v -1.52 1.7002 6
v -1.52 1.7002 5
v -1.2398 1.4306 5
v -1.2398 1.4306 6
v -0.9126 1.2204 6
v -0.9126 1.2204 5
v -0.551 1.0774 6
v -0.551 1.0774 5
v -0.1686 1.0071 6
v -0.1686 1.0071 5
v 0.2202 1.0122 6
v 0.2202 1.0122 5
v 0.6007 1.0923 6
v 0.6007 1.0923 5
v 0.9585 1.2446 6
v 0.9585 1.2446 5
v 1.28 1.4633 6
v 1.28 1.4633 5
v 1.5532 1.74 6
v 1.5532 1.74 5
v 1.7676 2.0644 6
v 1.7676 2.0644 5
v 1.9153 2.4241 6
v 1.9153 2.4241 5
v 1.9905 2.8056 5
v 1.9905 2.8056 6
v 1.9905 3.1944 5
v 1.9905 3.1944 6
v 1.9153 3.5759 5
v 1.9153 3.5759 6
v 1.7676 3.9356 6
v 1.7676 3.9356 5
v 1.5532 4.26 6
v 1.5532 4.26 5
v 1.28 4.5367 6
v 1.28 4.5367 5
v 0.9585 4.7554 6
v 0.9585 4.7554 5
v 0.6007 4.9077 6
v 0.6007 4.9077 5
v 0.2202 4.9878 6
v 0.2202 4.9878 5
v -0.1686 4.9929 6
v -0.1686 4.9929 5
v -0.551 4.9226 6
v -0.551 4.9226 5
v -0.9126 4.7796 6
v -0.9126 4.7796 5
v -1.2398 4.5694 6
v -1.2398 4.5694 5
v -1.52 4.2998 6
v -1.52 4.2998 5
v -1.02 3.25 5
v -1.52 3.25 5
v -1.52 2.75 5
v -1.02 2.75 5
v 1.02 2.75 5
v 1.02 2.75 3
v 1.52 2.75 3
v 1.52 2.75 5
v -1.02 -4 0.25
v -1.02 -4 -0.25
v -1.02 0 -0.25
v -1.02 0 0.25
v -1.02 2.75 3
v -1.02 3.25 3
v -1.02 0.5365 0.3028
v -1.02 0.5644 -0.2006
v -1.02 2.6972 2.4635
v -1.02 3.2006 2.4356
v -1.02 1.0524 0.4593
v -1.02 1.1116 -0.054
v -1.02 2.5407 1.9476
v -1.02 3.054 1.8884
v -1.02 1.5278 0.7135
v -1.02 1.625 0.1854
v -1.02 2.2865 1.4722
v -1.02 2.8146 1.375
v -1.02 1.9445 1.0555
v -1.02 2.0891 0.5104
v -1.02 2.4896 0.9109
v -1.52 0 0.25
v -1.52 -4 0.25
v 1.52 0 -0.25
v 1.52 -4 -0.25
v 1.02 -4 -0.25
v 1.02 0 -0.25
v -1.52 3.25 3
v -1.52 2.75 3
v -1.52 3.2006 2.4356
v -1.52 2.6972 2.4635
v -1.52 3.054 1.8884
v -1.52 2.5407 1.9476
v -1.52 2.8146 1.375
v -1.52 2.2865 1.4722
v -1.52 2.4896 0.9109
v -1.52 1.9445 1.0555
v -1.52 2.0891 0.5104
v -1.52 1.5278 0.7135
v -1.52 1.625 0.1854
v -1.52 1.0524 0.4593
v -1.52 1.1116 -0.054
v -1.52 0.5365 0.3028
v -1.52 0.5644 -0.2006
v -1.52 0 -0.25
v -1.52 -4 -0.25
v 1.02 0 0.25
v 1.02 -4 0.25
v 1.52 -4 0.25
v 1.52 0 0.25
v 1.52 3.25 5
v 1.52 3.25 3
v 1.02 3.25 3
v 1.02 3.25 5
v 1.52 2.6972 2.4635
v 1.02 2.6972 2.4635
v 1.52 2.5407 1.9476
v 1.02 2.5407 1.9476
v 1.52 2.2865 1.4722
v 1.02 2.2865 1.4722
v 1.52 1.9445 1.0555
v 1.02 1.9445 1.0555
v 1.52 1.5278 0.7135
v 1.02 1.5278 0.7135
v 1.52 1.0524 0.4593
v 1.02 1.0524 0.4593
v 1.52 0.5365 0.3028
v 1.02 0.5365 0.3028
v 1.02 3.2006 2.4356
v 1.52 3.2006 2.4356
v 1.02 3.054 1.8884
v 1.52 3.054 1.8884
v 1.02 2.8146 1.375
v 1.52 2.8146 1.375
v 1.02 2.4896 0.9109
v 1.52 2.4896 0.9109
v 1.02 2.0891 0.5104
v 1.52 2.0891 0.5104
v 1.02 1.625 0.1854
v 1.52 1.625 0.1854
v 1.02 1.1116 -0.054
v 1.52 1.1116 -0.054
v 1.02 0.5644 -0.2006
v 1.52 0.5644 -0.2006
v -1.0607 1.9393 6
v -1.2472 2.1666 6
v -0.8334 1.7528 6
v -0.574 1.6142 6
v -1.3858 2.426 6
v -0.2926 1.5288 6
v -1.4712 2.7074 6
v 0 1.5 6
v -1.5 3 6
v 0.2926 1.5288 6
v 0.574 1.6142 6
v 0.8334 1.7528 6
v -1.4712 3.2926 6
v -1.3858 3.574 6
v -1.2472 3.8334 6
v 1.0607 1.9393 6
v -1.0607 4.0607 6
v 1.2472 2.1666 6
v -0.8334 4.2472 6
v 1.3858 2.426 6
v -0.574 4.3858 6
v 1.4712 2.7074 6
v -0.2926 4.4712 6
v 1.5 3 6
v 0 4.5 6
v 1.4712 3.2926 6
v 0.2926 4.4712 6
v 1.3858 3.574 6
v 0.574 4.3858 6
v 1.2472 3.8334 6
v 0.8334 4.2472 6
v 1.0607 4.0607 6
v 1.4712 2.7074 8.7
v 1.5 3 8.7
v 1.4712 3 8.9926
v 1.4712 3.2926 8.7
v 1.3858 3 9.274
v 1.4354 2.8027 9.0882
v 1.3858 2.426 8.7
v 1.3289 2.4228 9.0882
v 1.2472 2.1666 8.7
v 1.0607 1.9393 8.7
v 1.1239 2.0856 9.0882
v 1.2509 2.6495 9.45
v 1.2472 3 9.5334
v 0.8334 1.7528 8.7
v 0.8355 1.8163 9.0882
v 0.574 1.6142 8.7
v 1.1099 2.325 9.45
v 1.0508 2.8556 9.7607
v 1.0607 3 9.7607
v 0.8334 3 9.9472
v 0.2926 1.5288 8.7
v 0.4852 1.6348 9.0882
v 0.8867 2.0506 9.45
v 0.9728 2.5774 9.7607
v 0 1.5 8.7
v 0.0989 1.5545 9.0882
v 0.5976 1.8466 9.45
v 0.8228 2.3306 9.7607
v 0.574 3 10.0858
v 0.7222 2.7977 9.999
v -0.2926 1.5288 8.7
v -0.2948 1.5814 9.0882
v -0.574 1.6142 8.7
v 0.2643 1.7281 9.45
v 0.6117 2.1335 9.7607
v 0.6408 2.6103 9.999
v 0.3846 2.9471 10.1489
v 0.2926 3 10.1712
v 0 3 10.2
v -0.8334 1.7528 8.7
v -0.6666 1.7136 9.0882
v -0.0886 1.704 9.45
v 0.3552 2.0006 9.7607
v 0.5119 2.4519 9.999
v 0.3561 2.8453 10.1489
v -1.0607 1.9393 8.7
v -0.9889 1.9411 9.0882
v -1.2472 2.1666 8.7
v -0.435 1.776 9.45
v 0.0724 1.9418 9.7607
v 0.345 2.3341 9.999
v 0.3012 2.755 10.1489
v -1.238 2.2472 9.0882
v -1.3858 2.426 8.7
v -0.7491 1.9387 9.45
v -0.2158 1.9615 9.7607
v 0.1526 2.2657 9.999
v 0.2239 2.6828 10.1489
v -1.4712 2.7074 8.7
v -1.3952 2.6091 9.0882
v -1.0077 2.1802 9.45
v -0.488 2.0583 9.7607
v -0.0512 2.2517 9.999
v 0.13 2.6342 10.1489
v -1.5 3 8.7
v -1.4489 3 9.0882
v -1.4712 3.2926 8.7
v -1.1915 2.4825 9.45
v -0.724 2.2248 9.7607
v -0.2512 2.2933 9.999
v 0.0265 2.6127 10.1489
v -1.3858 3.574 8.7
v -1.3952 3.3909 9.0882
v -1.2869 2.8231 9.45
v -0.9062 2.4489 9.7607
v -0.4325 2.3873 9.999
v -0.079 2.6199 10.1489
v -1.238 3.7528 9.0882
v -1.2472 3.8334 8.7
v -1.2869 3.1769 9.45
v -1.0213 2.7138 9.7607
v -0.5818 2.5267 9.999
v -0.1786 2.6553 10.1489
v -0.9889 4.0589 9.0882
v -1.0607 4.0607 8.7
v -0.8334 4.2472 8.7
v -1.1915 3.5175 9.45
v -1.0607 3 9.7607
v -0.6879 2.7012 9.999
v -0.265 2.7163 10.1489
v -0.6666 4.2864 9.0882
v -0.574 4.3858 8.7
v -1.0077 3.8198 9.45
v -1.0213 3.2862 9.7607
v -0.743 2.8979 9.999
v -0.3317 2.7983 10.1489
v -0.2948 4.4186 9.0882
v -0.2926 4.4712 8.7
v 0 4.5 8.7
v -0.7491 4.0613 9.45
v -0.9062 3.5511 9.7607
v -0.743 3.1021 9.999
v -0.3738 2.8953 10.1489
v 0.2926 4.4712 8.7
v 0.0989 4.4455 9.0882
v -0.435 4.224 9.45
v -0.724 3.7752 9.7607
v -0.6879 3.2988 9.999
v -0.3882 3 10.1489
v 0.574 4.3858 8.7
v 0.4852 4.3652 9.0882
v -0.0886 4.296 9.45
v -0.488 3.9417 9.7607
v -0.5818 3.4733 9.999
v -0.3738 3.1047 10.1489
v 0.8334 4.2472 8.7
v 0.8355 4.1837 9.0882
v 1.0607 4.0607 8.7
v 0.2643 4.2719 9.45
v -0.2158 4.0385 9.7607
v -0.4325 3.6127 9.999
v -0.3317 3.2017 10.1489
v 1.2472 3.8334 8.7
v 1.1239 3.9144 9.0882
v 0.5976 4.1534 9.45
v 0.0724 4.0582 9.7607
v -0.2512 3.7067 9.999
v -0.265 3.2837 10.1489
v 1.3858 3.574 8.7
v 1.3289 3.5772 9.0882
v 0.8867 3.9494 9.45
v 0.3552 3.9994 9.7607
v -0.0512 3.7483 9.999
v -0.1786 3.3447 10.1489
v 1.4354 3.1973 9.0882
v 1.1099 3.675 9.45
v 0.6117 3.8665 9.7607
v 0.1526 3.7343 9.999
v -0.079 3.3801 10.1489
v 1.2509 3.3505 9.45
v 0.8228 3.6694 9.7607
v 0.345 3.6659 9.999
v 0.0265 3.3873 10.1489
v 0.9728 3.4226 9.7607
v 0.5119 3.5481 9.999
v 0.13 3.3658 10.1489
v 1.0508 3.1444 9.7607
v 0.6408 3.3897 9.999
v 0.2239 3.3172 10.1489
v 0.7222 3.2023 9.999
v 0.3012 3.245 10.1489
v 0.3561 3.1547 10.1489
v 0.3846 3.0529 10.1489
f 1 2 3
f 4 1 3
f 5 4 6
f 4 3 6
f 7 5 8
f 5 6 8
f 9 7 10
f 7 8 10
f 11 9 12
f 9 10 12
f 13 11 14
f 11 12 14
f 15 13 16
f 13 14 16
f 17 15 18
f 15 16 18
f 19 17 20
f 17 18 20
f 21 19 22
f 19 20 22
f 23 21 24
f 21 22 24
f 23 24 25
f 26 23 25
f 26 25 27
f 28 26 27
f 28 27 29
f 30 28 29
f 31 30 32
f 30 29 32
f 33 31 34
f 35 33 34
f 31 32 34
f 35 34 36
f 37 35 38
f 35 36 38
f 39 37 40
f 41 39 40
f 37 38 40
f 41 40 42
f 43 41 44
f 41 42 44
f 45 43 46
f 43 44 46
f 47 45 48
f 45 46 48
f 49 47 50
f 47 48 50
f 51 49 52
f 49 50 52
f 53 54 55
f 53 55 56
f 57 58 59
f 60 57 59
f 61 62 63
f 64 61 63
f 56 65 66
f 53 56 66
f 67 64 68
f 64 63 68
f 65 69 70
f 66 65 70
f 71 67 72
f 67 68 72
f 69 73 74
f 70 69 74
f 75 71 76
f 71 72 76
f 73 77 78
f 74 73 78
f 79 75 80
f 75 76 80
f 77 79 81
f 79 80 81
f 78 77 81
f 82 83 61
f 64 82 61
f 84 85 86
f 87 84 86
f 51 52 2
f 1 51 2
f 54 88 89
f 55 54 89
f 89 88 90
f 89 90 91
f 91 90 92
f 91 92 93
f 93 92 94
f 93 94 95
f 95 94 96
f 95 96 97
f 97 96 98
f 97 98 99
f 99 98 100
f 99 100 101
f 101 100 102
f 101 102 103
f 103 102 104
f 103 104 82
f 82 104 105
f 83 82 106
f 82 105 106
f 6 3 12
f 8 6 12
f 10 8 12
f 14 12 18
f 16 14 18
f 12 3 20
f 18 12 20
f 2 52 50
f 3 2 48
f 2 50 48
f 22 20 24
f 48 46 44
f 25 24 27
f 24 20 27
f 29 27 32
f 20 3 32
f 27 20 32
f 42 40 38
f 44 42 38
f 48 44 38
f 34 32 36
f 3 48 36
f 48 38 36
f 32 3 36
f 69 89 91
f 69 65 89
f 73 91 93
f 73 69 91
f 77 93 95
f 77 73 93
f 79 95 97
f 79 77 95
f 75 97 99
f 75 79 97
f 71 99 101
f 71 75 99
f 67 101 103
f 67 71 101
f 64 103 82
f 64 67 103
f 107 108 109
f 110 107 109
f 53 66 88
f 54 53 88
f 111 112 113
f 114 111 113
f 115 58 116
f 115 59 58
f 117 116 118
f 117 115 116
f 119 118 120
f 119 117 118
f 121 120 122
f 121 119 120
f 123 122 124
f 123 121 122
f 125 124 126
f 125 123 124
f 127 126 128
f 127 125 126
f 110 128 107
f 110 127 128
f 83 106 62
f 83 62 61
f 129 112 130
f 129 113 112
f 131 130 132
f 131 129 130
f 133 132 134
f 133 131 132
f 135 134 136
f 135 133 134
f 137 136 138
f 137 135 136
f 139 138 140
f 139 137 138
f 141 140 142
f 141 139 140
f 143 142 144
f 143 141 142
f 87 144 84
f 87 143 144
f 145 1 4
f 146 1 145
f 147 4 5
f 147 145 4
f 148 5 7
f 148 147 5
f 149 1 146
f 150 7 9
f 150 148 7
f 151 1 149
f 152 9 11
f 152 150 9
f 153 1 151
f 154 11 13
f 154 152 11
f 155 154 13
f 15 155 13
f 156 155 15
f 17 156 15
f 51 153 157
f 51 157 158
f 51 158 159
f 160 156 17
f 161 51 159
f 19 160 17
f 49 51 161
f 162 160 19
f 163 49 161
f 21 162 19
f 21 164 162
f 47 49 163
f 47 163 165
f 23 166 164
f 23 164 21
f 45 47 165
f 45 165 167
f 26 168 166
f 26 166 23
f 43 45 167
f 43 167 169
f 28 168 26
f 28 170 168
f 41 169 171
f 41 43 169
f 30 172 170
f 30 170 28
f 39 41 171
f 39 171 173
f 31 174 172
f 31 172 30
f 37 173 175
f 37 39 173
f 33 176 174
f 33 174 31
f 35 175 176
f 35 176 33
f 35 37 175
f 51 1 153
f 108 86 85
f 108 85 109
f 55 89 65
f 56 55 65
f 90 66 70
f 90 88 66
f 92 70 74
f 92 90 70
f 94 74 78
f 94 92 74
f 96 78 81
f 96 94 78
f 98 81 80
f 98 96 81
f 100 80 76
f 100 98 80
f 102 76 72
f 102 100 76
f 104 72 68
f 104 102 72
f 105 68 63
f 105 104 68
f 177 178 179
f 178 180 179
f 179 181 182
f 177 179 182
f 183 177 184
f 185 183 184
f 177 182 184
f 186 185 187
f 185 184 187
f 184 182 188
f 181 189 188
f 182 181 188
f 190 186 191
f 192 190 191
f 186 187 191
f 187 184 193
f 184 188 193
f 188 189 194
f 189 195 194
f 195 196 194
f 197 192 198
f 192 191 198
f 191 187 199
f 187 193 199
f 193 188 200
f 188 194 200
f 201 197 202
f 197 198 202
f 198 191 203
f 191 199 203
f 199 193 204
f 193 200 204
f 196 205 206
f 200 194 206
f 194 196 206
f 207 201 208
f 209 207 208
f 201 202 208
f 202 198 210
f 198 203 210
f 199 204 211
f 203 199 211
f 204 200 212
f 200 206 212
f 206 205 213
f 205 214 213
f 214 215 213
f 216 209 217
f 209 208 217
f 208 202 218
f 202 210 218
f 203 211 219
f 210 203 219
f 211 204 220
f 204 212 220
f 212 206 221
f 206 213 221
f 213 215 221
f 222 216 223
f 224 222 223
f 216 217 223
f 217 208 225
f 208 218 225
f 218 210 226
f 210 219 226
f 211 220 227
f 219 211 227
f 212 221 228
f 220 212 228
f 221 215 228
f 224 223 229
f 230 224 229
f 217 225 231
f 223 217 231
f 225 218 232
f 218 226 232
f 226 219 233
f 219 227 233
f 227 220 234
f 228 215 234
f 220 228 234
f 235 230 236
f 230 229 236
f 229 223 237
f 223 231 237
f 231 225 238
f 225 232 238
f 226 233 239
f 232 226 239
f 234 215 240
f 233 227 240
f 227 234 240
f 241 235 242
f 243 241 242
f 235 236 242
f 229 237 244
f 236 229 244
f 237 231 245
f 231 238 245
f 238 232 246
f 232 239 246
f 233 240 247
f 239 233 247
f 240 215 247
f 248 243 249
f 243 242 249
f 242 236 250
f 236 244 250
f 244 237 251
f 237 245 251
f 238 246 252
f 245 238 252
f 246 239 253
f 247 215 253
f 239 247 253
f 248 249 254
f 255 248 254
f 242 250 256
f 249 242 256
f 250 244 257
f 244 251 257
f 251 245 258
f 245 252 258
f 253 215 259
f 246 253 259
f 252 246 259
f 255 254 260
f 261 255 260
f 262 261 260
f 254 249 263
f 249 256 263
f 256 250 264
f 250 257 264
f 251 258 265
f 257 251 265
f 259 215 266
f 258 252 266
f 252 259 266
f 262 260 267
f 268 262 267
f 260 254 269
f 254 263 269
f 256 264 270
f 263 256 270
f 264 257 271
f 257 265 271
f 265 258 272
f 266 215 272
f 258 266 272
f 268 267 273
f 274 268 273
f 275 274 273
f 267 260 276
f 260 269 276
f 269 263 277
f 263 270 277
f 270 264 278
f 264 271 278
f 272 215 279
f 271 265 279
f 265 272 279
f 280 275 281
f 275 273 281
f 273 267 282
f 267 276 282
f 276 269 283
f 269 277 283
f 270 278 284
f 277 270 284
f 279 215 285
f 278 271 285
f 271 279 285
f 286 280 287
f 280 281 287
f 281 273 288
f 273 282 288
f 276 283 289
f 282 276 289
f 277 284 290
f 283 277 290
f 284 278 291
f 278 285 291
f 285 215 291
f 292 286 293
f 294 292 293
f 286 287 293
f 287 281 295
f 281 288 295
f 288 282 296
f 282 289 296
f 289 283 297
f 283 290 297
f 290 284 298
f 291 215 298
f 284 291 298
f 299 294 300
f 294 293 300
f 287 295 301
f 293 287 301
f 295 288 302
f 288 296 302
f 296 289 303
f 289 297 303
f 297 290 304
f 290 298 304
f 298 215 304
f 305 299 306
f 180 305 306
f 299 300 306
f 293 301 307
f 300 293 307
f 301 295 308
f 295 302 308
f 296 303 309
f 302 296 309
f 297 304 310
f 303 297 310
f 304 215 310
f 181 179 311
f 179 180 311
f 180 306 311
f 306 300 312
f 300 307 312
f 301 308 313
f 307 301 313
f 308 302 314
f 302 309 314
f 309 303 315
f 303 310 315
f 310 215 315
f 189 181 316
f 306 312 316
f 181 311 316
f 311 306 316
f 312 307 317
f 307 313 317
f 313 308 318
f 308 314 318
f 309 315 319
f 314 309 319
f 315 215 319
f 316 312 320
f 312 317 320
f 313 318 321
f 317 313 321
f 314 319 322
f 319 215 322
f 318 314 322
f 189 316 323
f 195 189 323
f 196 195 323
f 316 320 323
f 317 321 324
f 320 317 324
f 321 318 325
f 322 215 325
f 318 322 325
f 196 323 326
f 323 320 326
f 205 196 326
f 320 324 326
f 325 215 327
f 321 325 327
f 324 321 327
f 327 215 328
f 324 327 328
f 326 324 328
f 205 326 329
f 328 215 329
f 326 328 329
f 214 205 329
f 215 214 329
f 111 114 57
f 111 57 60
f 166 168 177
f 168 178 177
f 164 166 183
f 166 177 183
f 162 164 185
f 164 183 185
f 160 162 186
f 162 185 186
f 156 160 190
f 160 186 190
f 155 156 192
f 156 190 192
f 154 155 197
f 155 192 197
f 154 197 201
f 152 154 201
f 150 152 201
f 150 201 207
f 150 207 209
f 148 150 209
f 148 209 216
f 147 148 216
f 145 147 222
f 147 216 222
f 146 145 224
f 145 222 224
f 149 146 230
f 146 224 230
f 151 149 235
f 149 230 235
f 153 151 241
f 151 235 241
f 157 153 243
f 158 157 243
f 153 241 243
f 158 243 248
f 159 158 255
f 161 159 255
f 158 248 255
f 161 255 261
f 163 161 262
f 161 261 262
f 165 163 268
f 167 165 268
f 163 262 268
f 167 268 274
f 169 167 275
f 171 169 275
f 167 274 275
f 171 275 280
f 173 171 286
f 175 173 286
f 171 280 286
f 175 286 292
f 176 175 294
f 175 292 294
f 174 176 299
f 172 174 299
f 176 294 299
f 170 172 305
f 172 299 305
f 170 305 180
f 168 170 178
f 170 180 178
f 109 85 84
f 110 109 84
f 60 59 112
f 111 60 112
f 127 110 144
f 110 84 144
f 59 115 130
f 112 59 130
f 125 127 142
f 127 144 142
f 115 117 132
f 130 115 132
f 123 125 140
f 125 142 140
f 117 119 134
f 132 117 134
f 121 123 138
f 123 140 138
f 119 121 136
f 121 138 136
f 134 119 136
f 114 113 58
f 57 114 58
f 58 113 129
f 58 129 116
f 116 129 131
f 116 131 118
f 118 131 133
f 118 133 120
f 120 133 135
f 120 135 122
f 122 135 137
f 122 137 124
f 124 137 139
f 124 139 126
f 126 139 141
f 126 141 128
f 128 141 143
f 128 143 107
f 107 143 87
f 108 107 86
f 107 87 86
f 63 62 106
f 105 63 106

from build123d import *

# Parameters (mm, degrees)
EXTRUDE_START   = 5
EXTRUDE_2_DEPTH = 1
SKETCH_4_W      = 0.5
SKETCH_4_H      = 0.5


with BuildPart() as part:
    # Эскиз2 → Бобышка-Вытянуть2 (new body)
    with BuildSketch(Plane.XY.offset(EXTRUDE_START)):
        with BuildLine():
            Line((-1.52, 4.299846145), (-1.52, 1.700153855))
            ThreePointArc((-1.52, 1.700153855), (2, 3), (-1.52, 4.299846145))
        make_face()
    extrude(amount=EXTRUDE_2_DEPTH)

    # Эскиз3 → Повернуть1 (revolve)
    with BuildSketch(Plane(origin=(0, 0, 0), x_dir=(0, -1, 0), z_dir=(1, 0, 0)), mode=Mode.PRIVATE) as revolve_1_sk:
        with BuildLine():
            Line((-4.5, -6), (-4.5, -8.7))
            ThreePointArc((-4.5, -8.7), (-4.060660172, -9.760660172), (-3, -10.2))
            Line((-3, -10.2), (-3, -6))
            Line((-3, -6), (-4.5, -6))
        make_face()
    revolve(revolve_1_sk.sketch.rotate(Axis((0, 3, 13.296819565), (0, 0, -1)), 90), axis=Axis((0, 3, 13.296819565), (0, 0, -1)))


with BuildPart() as body_2:
    # По траектории2: sweep along a path in Эскиз5
    with BuildLine(Plane(origin=(0, 0, 0), x_dir=(0, 0, -1), z_dir=(1, 0, 0))) as sweep_2_path:
        Line((-5, 3), (-3, 3))
        ThreePointArc((-3, 3), (-0.878679656, 2.121320344), (0, 0))
        Line((0, 0), (0, -4))
    # Эскиз4 → По траектории2 (sweep)
    with BuildSketch(Plane.XY.offset(5)):
        with Locations((-1.27, 3)):
            Rectangle(SKETCH_4_W, SKETCH_4_H)
        with Locations((1.27, 3)):
            Rectangle(SKETCH_4_W, SKETCH_4_H)
    sweep(path=sweep_2_path.line)


solid = Compound([part.part, body_2.part])
